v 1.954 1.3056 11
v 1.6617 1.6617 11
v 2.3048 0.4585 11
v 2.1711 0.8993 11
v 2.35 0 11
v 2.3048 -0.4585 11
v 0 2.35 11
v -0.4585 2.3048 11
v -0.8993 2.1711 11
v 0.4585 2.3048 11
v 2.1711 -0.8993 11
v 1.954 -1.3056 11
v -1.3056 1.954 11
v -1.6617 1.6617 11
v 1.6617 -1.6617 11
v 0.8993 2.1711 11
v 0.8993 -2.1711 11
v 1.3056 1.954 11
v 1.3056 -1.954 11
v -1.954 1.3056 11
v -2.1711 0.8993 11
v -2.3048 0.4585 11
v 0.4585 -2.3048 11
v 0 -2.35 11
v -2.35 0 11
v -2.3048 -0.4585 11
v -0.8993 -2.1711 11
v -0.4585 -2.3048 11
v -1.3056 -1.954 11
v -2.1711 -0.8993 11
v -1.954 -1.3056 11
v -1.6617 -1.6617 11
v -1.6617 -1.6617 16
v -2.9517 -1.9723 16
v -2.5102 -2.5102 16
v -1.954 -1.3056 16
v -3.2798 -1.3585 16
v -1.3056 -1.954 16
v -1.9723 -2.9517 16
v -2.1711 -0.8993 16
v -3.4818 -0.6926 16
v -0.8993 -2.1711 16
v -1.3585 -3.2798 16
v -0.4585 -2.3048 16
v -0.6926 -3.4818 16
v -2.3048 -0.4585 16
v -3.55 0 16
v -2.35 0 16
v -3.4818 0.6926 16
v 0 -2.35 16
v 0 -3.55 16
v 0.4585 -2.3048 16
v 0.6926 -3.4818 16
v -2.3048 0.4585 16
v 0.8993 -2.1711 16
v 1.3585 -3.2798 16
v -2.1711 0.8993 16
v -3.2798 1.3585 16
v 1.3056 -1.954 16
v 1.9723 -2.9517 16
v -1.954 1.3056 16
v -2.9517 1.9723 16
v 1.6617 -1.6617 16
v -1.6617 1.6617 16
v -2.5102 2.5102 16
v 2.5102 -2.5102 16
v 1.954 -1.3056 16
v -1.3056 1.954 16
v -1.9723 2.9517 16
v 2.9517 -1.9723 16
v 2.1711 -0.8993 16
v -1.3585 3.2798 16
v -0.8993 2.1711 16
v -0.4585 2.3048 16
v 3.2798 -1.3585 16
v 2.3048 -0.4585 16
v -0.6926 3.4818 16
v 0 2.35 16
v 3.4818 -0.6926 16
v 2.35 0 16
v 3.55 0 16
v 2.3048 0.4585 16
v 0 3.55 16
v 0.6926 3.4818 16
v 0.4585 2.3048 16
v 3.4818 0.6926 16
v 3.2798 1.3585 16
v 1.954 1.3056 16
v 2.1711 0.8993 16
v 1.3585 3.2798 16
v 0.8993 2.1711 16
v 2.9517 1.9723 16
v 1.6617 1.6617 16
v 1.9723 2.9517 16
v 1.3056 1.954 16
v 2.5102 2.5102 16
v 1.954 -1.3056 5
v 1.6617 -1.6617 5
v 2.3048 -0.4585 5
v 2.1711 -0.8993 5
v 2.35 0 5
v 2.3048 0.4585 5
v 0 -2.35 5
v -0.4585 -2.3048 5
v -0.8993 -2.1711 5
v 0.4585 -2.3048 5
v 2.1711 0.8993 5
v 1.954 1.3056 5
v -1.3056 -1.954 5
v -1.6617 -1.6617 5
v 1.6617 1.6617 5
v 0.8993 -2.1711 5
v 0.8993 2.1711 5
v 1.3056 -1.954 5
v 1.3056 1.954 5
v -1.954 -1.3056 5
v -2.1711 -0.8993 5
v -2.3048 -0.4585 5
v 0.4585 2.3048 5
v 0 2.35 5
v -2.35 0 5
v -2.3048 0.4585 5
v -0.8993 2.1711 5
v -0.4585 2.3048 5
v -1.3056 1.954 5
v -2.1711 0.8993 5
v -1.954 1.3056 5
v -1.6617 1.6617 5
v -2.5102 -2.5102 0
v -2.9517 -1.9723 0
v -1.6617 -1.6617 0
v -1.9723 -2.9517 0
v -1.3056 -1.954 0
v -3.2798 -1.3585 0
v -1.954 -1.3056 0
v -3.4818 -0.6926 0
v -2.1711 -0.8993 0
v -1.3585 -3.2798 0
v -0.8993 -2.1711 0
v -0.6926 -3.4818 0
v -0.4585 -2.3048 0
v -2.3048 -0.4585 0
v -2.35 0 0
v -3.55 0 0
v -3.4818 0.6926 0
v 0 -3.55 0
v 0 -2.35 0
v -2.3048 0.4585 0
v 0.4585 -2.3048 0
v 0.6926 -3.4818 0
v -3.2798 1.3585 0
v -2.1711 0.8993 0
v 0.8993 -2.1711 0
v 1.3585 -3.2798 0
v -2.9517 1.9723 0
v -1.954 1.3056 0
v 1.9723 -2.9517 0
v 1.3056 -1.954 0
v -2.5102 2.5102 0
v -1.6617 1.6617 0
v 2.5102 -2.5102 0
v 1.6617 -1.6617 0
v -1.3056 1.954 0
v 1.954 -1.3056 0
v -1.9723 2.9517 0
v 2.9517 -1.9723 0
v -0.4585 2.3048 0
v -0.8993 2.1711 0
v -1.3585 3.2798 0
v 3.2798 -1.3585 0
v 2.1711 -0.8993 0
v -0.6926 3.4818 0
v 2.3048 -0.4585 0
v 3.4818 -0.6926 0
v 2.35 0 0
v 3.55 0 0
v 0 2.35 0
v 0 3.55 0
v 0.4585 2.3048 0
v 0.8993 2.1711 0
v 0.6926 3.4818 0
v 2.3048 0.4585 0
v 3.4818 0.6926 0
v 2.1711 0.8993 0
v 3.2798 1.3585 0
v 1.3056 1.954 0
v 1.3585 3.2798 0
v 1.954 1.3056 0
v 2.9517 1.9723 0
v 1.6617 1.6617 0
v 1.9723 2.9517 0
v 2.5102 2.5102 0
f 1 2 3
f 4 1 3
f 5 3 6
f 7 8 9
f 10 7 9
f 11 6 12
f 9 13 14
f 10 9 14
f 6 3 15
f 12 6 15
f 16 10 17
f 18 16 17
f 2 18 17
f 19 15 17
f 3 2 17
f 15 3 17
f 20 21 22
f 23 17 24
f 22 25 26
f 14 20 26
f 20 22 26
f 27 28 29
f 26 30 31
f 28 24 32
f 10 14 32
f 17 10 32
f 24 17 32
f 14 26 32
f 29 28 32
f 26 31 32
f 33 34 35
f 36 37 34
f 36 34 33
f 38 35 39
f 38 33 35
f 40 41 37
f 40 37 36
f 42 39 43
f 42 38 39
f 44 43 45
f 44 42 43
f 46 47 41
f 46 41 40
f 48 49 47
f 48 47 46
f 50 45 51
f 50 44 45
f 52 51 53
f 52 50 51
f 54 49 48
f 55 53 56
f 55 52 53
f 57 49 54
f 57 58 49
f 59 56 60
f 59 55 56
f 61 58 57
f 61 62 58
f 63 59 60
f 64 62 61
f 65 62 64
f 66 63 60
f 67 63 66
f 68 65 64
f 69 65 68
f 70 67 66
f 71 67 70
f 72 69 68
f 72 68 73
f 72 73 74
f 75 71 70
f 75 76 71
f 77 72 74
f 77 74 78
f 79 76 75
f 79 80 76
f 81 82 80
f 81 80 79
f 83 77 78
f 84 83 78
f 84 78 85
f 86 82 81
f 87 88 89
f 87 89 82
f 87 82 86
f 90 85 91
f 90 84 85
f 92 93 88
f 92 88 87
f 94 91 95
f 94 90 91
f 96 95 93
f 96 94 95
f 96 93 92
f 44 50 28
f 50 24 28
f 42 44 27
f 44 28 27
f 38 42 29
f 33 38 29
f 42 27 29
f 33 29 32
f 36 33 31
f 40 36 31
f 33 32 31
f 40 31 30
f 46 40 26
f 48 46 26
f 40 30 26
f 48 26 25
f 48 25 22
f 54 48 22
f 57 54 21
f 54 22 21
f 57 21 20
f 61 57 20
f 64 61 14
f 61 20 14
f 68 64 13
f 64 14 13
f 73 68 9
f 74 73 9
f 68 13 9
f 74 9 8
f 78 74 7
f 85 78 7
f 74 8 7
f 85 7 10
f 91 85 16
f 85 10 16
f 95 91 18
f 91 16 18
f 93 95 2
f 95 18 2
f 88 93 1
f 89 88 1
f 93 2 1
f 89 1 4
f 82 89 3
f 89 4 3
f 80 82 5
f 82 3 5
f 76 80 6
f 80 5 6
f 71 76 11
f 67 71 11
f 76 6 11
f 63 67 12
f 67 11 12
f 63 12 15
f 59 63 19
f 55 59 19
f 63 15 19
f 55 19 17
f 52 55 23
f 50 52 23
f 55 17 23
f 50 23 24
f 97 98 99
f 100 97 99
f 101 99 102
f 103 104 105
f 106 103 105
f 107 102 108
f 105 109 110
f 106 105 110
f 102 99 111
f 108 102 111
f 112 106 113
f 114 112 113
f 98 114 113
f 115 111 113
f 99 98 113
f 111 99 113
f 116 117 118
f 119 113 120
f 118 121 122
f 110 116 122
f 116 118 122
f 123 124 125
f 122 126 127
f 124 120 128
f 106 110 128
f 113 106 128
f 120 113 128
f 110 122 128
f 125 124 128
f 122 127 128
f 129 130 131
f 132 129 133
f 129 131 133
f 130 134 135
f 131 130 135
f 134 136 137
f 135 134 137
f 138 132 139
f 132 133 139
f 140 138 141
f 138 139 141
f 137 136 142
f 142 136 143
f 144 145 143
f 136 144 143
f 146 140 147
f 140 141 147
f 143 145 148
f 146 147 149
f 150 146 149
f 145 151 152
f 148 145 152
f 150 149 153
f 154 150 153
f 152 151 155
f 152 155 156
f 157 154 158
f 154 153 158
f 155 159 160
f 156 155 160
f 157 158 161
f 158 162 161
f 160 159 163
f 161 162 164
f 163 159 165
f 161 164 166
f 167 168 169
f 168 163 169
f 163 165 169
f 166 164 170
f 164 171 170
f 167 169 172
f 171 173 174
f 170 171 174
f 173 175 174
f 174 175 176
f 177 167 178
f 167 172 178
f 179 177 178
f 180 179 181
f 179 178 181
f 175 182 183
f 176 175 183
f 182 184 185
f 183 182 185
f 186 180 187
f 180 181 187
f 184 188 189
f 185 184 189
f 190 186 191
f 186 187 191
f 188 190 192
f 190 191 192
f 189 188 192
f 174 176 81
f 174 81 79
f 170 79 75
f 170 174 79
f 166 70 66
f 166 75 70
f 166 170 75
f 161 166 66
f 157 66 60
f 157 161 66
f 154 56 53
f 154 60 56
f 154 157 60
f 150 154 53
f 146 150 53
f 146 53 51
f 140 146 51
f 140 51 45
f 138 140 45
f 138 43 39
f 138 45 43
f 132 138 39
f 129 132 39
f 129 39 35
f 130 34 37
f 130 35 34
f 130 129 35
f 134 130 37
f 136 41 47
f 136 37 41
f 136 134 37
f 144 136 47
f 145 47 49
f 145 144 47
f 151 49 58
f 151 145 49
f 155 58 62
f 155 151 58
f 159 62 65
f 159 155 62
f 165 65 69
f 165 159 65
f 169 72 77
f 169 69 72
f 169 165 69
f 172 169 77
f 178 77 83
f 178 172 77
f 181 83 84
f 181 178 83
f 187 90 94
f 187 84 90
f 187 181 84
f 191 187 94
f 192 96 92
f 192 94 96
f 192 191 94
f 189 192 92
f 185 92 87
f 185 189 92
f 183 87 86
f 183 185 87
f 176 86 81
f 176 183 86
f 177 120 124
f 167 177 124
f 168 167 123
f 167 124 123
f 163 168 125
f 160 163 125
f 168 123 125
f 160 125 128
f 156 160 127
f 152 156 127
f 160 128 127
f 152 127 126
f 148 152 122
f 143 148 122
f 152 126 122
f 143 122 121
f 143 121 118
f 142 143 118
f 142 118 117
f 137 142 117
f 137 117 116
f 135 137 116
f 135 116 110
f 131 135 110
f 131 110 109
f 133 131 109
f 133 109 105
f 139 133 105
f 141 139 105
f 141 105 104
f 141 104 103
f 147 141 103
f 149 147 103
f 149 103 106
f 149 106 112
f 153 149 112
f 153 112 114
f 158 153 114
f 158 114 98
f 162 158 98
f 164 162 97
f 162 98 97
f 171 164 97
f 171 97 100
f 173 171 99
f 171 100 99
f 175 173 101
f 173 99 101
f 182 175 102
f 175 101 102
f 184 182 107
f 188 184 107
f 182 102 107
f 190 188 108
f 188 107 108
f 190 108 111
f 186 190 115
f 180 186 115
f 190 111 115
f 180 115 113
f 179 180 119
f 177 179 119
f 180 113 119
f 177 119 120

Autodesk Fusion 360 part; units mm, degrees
sketch "Sketch1" plane through (0, 0, 0) normal (0, 0, 1) x (1, 0, 0)
  circle A0 centre (0, 0) radius 3.55
  dimension "d1" = 7.1
extrude "Extrude1" add sketch "Sketch1" along normal blind 16
hole "Hole1" at (0, 0, 16) direction (0, 0, -1) diameter 4.7 depth 5 tip angle 180
hole "Hole2" at (0, 0, 0) direction (0, 0, 1) diameter 4.7 depth 5 tip angle 180
